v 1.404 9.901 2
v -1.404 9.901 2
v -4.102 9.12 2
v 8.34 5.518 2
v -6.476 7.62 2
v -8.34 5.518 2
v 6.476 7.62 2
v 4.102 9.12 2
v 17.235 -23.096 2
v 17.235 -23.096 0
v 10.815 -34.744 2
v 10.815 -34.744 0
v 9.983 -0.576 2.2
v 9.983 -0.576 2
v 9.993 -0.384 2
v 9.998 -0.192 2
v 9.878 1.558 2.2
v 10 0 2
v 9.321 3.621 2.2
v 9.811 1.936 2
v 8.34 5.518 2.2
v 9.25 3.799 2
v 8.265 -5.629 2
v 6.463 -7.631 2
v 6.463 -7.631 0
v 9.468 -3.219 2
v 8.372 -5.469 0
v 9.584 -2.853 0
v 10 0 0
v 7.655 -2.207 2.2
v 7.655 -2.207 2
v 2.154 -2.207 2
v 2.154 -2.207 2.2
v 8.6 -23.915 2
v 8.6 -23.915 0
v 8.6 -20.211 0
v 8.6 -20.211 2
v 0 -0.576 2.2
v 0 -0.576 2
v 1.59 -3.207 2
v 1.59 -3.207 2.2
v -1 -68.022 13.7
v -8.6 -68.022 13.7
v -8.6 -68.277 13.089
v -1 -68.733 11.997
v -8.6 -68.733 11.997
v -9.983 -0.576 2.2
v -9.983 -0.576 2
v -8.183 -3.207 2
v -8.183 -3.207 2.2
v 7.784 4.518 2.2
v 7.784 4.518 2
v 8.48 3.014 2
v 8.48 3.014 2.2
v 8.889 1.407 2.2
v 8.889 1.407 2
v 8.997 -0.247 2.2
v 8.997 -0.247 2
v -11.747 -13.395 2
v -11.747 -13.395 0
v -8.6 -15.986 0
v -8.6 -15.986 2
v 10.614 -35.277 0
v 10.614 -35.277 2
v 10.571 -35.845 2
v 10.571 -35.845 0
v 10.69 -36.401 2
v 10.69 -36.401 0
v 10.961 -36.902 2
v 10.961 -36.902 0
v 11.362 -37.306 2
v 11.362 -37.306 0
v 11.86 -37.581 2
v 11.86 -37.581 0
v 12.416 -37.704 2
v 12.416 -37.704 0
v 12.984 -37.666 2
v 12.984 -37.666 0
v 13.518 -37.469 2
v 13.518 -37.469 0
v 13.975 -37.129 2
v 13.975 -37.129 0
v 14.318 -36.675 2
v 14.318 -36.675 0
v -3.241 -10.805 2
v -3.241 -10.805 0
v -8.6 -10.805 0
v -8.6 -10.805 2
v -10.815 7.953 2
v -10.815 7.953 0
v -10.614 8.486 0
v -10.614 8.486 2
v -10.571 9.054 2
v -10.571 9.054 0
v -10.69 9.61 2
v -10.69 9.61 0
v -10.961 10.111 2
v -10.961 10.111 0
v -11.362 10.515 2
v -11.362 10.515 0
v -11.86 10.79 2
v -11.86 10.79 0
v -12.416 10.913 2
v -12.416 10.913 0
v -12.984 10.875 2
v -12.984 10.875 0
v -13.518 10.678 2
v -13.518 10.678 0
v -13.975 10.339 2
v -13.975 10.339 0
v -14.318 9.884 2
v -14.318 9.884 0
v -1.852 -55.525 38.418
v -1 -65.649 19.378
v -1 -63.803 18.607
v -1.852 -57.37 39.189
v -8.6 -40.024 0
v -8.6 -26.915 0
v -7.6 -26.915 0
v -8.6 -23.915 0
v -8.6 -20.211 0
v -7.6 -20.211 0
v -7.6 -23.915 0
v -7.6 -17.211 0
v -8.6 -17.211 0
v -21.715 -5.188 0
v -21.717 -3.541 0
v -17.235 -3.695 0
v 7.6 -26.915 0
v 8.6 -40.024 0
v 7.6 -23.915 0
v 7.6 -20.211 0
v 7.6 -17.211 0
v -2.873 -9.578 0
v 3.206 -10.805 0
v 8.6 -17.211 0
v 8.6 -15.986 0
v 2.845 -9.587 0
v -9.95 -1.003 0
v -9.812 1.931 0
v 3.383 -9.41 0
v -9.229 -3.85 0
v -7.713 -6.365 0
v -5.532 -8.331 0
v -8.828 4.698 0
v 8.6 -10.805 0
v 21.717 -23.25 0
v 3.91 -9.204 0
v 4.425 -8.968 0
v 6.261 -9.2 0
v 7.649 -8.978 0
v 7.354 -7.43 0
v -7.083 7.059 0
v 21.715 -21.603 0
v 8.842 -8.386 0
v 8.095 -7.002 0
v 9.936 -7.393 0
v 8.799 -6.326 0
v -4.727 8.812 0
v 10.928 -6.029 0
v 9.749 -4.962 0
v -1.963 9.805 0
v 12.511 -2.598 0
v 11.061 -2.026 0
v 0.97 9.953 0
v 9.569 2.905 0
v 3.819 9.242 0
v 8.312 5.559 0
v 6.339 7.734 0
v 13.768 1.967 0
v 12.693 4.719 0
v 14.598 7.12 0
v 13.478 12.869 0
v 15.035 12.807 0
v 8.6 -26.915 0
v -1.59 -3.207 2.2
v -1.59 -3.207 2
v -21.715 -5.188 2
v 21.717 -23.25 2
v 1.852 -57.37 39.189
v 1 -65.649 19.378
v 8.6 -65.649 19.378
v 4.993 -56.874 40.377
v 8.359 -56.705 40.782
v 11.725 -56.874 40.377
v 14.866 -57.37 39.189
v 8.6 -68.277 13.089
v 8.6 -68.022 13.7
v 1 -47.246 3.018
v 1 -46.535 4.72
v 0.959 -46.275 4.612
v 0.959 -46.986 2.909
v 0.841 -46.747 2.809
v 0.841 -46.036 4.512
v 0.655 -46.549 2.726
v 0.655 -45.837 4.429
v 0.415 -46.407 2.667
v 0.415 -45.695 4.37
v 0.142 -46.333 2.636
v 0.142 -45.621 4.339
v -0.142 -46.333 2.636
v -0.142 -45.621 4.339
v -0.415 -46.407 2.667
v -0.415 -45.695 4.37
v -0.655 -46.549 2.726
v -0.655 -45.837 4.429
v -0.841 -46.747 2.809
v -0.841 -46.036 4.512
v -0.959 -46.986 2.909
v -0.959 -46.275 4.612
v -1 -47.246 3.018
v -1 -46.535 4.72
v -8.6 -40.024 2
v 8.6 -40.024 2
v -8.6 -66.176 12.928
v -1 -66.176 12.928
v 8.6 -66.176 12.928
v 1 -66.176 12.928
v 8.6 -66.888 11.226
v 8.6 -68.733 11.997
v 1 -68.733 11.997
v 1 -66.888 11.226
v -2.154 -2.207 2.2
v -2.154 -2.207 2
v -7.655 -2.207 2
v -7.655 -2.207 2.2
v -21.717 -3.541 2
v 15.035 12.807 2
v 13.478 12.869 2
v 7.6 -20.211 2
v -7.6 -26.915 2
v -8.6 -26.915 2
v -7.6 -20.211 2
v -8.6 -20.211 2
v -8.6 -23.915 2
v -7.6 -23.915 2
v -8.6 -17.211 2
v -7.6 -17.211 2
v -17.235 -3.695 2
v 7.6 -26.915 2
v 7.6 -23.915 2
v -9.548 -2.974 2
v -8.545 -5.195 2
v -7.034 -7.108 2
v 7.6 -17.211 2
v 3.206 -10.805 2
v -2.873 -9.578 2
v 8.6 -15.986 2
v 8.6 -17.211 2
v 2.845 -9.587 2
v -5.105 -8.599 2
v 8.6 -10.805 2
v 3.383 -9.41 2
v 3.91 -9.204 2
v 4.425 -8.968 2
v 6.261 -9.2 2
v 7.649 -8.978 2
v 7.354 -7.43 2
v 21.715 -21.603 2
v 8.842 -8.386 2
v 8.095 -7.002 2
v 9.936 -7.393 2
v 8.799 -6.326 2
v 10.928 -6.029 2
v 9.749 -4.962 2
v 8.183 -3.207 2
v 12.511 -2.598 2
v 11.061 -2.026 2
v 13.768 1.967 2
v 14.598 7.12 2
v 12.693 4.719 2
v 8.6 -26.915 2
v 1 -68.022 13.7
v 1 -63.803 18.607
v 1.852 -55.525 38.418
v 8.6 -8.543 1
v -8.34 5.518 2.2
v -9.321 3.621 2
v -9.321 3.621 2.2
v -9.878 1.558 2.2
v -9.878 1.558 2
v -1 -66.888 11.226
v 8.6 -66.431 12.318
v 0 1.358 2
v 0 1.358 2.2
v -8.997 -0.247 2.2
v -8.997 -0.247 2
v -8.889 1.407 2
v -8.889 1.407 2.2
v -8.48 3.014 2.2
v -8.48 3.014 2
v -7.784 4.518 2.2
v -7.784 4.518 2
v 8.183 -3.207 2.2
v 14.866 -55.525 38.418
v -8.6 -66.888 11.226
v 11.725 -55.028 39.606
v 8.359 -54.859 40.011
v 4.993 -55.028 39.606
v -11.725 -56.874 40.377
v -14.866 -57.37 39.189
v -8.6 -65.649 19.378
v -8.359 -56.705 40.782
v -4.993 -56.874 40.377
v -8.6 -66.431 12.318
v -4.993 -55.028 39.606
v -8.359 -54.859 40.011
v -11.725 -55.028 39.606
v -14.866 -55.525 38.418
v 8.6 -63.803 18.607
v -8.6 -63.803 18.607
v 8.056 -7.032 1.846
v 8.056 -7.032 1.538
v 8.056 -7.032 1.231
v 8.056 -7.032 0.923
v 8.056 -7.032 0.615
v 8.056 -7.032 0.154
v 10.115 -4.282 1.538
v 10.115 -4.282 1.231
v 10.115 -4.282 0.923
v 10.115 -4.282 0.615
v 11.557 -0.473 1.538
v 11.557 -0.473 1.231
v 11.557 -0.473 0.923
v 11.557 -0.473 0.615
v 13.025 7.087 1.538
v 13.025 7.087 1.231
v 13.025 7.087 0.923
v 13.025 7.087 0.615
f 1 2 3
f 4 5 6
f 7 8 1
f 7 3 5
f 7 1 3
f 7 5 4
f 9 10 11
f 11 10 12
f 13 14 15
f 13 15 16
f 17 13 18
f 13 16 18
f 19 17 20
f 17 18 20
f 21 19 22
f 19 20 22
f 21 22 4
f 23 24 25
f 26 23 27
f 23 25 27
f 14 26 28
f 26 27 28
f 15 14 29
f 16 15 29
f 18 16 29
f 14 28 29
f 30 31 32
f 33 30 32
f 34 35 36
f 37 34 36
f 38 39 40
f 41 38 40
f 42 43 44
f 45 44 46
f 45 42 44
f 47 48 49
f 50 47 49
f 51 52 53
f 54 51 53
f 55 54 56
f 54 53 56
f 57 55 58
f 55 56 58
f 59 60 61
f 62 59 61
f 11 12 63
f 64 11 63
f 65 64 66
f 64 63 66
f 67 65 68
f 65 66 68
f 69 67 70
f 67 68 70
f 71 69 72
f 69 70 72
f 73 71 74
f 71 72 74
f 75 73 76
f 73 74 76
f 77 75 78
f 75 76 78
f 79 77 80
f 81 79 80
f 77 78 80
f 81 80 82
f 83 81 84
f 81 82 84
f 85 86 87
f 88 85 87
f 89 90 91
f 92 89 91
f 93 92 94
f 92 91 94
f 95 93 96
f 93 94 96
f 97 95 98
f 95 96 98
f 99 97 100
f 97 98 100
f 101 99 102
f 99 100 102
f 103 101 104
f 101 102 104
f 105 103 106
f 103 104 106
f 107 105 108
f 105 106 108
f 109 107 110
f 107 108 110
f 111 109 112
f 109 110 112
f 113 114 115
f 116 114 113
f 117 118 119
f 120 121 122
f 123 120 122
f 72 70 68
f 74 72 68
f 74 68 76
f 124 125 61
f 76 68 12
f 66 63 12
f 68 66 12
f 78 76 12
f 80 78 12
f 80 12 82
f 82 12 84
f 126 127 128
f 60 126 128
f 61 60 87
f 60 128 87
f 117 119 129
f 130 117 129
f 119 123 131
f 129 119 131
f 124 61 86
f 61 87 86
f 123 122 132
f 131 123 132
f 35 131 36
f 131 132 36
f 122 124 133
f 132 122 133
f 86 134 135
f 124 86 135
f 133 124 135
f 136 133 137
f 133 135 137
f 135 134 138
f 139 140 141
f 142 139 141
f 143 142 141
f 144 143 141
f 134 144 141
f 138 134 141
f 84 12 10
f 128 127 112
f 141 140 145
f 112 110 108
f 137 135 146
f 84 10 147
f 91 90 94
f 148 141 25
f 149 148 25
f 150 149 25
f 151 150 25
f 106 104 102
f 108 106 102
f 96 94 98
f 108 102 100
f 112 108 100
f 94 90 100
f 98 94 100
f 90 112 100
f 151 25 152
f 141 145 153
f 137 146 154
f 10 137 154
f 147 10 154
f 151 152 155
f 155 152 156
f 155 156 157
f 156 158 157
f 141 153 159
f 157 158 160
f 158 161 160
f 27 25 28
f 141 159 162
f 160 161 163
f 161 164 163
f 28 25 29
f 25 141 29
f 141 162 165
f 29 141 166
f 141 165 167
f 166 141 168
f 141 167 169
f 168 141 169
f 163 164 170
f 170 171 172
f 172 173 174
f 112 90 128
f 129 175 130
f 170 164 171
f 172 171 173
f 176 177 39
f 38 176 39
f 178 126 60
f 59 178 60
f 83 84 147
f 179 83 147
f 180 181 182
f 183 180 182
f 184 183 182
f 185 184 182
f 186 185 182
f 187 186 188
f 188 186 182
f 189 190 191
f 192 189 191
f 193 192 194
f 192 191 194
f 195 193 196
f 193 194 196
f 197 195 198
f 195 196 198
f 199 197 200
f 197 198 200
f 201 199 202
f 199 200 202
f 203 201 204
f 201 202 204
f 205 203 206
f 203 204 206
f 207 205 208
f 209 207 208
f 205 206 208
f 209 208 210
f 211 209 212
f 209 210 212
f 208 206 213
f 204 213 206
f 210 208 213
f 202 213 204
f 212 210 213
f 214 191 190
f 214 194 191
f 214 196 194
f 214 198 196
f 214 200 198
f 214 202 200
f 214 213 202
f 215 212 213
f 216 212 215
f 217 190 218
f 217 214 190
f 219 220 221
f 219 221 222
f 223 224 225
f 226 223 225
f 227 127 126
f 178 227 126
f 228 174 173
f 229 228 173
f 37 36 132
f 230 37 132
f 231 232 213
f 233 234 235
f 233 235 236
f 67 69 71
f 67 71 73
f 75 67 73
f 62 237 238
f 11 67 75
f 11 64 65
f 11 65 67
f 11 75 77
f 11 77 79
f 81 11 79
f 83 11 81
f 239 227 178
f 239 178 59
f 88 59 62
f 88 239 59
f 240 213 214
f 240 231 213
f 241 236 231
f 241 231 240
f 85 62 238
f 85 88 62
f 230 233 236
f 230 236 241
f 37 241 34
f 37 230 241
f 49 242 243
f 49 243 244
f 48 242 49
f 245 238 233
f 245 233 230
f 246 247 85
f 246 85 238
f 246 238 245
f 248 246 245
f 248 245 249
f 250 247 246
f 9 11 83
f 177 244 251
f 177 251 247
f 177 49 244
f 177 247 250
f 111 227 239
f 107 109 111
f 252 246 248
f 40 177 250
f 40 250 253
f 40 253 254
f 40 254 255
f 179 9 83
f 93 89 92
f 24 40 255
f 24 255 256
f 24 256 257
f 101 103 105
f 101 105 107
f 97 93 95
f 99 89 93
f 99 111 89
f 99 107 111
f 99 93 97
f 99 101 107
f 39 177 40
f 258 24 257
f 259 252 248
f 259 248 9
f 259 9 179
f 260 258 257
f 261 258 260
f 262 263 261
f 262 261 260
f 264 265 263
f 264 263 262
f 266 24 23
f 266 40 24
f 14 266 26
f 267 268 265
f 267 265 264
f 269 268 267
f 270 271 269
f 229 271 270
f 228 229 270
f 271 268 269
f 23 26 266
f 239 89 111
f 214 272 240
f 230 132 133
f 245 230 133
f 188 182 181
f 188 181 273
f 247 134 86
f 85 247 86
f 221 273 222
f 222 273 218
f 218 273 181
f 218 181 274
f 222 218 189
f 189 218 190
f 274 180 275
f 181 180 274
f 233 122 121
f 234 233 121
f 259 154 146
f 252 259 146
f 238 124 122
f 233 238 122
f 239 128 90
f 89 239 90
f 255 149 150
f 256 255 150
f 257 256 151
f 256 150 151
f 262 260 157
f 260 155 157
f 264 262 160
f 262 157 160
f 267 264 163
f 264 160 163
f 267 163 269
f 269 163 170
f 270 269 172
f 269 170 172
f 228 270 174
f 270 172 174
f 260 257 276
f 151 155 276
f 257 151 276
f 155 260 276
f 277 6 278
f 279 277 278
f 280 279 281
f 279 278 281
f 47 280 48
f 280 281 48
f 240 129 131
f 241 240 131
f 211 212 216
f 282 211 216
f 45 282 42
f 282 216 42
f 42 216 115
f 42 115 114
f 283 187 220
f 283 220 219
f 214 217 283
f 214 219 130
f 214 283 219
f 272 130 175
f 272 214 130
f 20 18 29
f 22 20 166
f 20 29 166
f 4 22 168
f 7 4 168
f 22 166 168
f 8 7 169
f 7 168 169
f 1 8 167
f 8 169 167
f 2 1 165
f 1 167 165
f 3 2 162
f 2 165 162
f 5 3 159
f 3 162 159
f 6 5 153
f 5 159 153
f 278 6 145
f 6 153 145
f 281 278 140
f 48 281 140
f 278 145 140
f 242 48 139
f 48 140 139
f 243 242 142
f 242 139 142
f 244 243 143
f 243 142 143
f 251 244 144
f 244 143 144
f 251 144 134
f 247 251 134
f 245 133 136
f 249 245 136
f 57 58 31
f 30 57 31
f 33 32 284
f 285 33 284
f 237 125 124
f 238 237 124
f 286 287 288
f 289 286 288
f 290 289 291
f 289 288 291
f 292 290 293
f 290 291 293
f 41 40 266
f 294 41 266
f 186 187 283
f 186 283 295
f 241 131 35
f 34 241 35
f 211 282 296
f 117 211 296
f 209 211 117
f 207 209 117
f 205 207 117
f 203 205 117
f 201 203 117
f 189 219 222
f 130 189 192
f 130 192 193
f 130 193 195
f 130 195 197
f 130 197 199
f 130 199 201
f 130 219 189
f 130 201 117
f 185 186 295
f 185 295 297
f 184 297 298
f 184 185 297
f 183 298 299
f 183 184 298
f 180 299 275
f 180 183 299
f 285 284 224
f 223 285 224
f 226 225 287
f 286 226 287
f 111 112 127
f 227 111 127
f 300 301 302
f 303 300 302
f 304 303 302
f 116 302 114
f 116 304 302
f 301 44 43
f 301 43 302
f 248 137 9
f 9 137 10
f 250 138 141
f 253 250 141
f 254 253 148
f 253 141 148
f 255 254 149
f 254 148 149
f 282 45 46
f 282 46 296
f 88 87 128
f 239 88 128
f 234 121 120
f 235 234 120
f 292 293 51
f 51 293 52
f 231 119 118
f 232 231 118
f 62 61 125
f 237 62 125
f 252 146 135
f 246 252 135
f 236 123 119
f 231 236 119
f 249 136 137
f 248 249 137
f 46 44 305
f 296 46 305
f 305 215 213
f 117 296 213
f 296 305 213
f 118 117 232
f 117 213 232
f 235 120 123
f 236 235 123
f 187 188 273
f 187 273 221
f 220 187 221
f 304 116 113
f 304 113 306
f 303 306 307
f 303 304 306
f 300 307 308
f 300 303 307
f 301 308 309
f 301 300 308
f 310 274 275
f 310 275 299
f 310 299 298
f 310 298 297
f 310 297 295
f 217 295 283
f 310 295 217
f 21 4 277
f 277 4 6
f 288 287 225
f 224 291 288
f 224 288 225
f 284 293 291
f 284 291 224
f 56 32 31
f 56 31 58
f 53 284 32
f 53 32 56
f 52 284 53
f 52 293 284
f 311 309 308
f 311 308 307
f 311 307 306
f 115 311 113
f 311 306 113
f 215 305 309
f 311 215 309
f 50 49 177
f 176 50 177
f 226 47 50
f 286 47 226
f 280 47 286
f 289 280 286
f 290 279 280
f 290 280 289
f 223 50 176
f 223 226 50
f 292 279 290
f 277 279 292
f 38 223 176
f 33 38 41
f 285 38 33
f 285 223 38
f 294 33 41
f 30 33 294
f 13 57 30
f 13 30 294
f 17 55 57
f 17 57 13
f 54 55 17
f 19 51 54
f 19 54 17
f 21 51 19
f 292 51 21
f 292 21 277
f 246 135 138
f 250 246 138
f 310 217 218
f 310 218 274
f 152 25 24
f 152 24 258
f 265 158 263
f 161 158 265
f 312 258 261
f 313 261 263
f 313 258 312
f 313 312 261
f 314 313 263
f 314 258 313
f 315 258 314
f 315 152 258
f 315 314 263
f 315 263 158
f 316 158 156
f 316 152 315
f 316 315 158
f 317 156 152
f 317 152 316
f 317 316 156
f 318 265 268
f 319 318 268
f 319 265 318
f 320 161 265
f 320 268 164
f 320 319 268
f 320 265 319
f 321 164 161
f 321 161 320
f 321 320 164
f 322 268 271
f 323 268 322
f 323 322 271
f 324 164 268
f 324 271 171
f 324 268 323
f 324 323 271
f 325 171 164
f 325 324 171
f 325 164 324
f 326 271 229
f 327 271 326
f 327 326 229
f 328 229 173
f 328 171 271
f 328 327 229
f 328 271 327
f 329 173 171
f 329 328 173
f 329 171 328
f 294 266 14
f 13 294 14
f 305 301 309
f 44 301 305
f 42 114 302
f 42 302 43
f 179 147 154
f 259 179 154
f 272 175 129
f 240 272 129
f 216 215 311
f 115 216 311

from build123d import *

# Parameters (mm, degrees)
F1_DEPTH = 2
F3_DEPTH = 17.200789751
F4_W     = 1
F4_H     = 2
F5_DEPTH = 25
F7_DEPTH = 2
F9_DEPTH = 0.2


# Not quite as in the source:
# - the dataset's text gives a spline's control points without its knots; the knots are read off the source's solid
# - a feature names something its author has since deleted; it is built from what else it names


with BuildPart() as f1:
    # F0 (on Top) → F1 (new body)
    with BuildSketch(Plane.XY):
        with BuildLine():
            ThreePointArc((6.4629719502, -7.6308579839), (9.0727537028, -4.2053704057), (10, 0))
            ThreePointArc((10, 0), (-5.9694275413, 8.0228383275), (-2.8731869657, -9.5783504143))
            Line((-2.8731869657, -9.5783504143), (0, 0))
            Line((0, 0), (1.8618540828, -6.2738101865))
            add(Edge.make_bspline(
                [(1.8618540828, -6.2738101865), (1.9794198127, -6.3341629295), (2.5732776532, -6.6333178765), (3.6057370778, -7.0964112527), (4.8687885055, -7.50576435), (5.8045739388, -7.6494945297), (6.2976751035, -7.6438504545), (6.4629719502, -7.6308579839)],
                knots=[0.0471973375, 0.0471973375, 0.0471973375, 0.0471973375, 0.0625, 0.125, 0.1875, 0.25, 0.2838293075, 0.2838293075, 0.2838293075, 0.2838293075], degree=3))
        make_face()
        with BuildLine():
            Line((0, 0), (-2.8731869657, -9.5783504143))
            ThreePointArc((-2.8731869657, -9.5783504143), (-0.0146952719, -9.9999892024), (2.8450232941, -9.5867534888))
            Line((2.8450232941, -9.5867534888), (2.4577875555, -8.2819017585))
            Line((2.4577875555, -8.2819017585), (1.8618540828, -6.2738101865))
            Line((1.8618540828, -6.2738101865), (0, 0))
        make_face()
        with BuildLine():
            ThreePointArc((2.8450232941, -9.5867534888), (-0.0146952719, -9.9999892024), (-2.8731869657, -9.5783504143))
            Line((-2.8731869657, -9.5783504143), (-3.241058439, -10.8047244445))
            Line((-3.241058439, -10.8047244445), (3.2064757654, -10.8047244445))
            Line((3.2064757654, -10.8047244445), (2.8450232941, -9.5867534888))
        make_face()
        with BuildLine():
            add(Edge.make_bspline(
                [(6.4629719502, -7.6308579839), (6.6030627596, -7.619846729), (6.8840296576, -7.5803052276), (7.2792450589, -7.4693493545), (7.6665868261, -7.2958798164), (8.0522350381, -7.0483493763), (8.4601010219, -6.700195356), (8.8775961576, -6.2496121629), (9.4379128784, -5.5115962551), (10.1252991034, -4.3405271139), (10.8897039738, -2.5813381399), (11.5728725961, -0.5166619682), (12.3603130252, 2.5826938425), (13.095778184, 6.9972675513), (13.399766994, 10.8869404738), (13.4782410246, 12.8689533823)],
                knots=[0.2838293075, 0.2838293075, 0.2838293075, 0.2838293075, 0.3125, 0.34375, 0.375, 0.40625, 0.4375, 0.46875, 0.5, 0.5625, 0.625, 0.6875, 0.75, 0.875, 1, 1, 1, 1], degree=3))
            ThreePointArc((6.4629719502, -7.6308579839), (5.4847517485, -8.3616683896), (4.4247539743, -8.9678064356))
            add(Edge.make_bspline(
                [(4.4247539743, -8.9678064356), (5.941531364, -9.347351876), (11.7155314673, -9.1561084525), (14.6416607546, 2.8636422945), (15.0353610516, 12.807302177)],
                knots=[0.1854268528, 0.1854268528, 0.1854268528, 0.1854268528, 0.3850411547, 1, 1, 1, 1], degree=3))
            Line((15.0353610516, 12.807302177), (13.4782410246, 12.8689533823))
        make_face()
        with BuildLine():
            ThreePointArc((4.4247539743, -8.9678064356), (5.4847517485, -8.3616683896), (6.4629719502, -7.6308579839))
            add(Edge.make_bspline(
                [(1.8618540828, -6.2738101865), (1.9794198127, -6.3341629295), (2.5732776532, -6.6333178765), (3.6057370778, -7.0964112527), (4.8687885055, -7.50576435), (5.8045739388, -7.6494945297), (6.2976751035, -7.6438504545), (6.4629719502, -7.6308579839)],
                knots=[0.0471973375, 0.0471973375, 0.0471973375, 0.0471973375, 0.0625, 0.125, 0.1875, 0.25, 0.2838293075, 0.2838293075, 0.2838293075, 0.2838293075], degree=3))
            Line((1.8618540828, -6.2738101865), (2.4577875555, -8.2819017585))
            add(Edge.make_bspline(
                [(2.4577875555, -8.2819017585), (3.1280804798, -8.5721149462), (3.7854626045, -8.8078356145), (4.4247539743, -8.9678064356)],
                knots=[0.1012934121, 0.1012934121, 0.1012934121, 0.1012934121, 0.1854268528, 0.1854268528, 0.1854268528, 0.1854268528], degree=3))
        make_face()
        with BuildLine():
            Line((2.4577875555, -8.2819017585), (2.8450232941, -9.5867534888))
            ThreePointArc((2.8450232941, -9.5867534888), (3.6480390961, -9.3108437186), (4.4247539743, -8.9678064356))
            add(Edge.make_bspline(
                [(2.4577875555, -8.2819017585), (3.1280804798, -8.5721149462), (3.7854626045, -8.8078356145), (4.4247539743, -8.9678064356)],
                knots=[0.1012934121, 0.1012934121, 0.1012934121, 0.1012934121, 0.1854268528, 0.1854268528, 0.1854268528, 0.1854268528], degree=3))
        make_face()
        Polygon((3.2064757654, -10.8047244445), (-3.241058439, -10.8047244445), (-8.6003948755, -10.8047244445), (-8.6003948755, -15.9862233672), (-8.6003948755, -17.2114234168), (-7.6003948755, -17.2114234168), (-7.6003948755, -20.2114234168), (-8.6003948755, -20.2114234168), (-8.6003948755, -23.9146029156), (-7.6003948755, -23.9146029156), (-7.6003948755, -26.9146029156), (-8.6003948755, -26.9146029156), (-8.6003948755, -40.0244813867), (8.6003948755, -40.0244813867), (8.6003948755, -26.9146029156), (7.6003948755, -26.9146029156), (7.6003948755, -23.9146029156), (8.6003948755, -23.9146029156), (8.6003948755, -20.2114234168), (7.6003948755, -20.2114234168), (7.6003948755, -17.2114234168), (8.6003948755, -17.2114234168), (8.6003948755, -15.9862233672), (8.6003948755, -10.8047244445), align=None)
        Polygon((-8.6003948755, -15.9862233672), (-8.6003948755, -10.8047244445), (-11.7467804993, -13.3954739058), align=None)
        with BuildLine():
            Line((-11.7467804993, -13.3954739058), (-8.6003948755, -10.8047244445))
            Line((-8.6003948755, -10.8047244445), (-17.2348651583, -3.6950589713))
            Line((-17.2348651583, -3.6950589713), (-10.8148216824, 7.9533712388))
            ThreePointArc((-10.8148216824, 7.9533712388), (-11.6010166189, 10.6703360015), (-14.3179813816, 9.884141065))
            Line((-14.3179813816, 9.884141065), (-21.7172442848, -3.5409701289))
            Line((-21.7172442848, -3.5409701289), (-21.7148243129, -5.1877374014))
            Line((-21.7148243129, -5.1877374014), (-11.7467804993, -13.3954739058))
        make_face()
        with BuildLine():
            Line((21.7148243129, -21.6032104103), (8.6003948755, -10.8047244445))
            Line((8.6003948755, -10.8047244445), (8.6003948755, -15.9862233672))
            Line((8.6003948755, -15.9862233672), (17.2348651583, -23.0958888404))
            Line((17.2348651583, -23.0958888404), (10.8148216824, -34.7443190505))
            ThreePointArc((10.8148216824, -34.7443190505), (11.6010166189, -37.4612838132), (14.3179813816, -36.6750888767))
            Line((14.3179813816, -36.6750888767), (21.7172442848, -23.2499776828))
            Line((21.7172442848, -23.2499776828), (21.7148243129, -21.6032104103))
        make_face()
    extrude(amount=F1_DEPTH)

    # F2 (on face) → F3 (join, through all)
    with BuildSketch(Plane.YZ.offset(8.6003948755)):
        Polygon((-40.0244813867, 0), (-40.0244813867, 2), (-66.176410403, 12.9284200062), (-66.8879257534, 11.2257494531), align=None)
        Polygon((-66.8879257534, 11.2257494531), (-66.176410403, 12.9284200062), (-68.0217670369, 13.6995612992), (-68.7332823873, 11.9968907461), align=None)
        Polygon((-68.0217670369, 13.6995612992), (-66.176410403, 12.9284200062), (-63.8033605813, 18.6071759886), (-65.6487172152, 19.3783172816), align=None)
    extrude(amount=-F3_DEPTH)

    # F4 (on face) → F5 (cut)
    with BuildSketch(Plane(origin=(0, -2.8656632843, -6.8575899128), x_dir=(1, 0, 0), z_dir=(0, 0.3855706465, 0.9226783169))):
        with Locations((-0.5, -67.044358232)):
            Rectangle(F4_W, F4_H)
        with BuildLine():
            Line((1, -68.044358232), (0, -68.044358232))
            Line((0, -68.044358232), (-1, -68.044358232))
            Line((-1, -68.044358232), (-1, -69.7565637529))
            ThreePointArc((-1, -69.7565637529), (0, -70.7565637529), (1, -69.7565637529))
            Line((1, -69.7565637529), (1, -68.044358232))
        make_face()
        with Locations((0.5, -67.044358232)):
            Rectangle(F4_W, F4_H)
        with BuildLine():
            Line((-1, -66.044358232), (0, -66.044358232))
            Line((0, -66.044358232), (1, -66.044358232))
            Line((1, -66.044358232), (1, -44.7565637529))
            ThreePointArc((1, -44.7565637529), (0, -43.7565637529), (-1, -44.7565637529))
            Line((-1, -44.7565637529), (-1, -66.044358232))
        make_face()
    extrude(amount=-F5_DEPTH, mode=Mode.SUBTRACT)

    # F6 (on face) → F7 (join)
    with BuildSketch(Plane(origin=(0, -62.7830539309, 26.2359071944), x_dir=(1, 0, 0), z_dir=(0, -0.9226783169, 0.3855706465))):
        with BuildLine():
            ThreePointArc((-1.8515158445, 14.0382554382), (-8.3589539863, 15.7649961788), (-14.8663921282, 14.0382554382))
            Line((-14.8663921282, 14.0382554382), (-1.8515158445, 14.0382554382))
        make_face()
        Polygon((1, -15.4322651642), (8.6003948755, -15.4322651642), (8.6003948755, -14.2483813688), (8.6003948755, -7.4322651642), (1, -7.4322651642), align=None)
        with BuildLine():
            Line((8.6003948755, -7.4322651642), (8.6003948755, -14.2483813688))
            Line((8.6003948755, -14.2483813688), (14.8663921282, 14.0382554382))
            ThreePointArc((14.8663921282, 14.0382554382), (8.3589539863, 15.7649961788), (1.8515158445, 14.0382554382))
            Line((1.8515158445, 14.0382554382), (1, -7.4322651642))
            Line((1, -7.4322651642), (8.6003948755, -7.4322651642))
        make_face()
        Polygon((-8.6003948755, -7.4322651642), (-1, -7.4322651642), (-1.8515158445, 14.0382554382), (-14.8663921282, 14.0382554382), (-8.6003948755, -14.2483813688), align=None)
    extrude(amount=-F7_DEPTH)

    # F8 (on face) → F9 (join)
    with BuildSketch(Plane.XY.offset(2)):
        with BuildLine():
            Line((8.3395420131, 5.5183366165), (-8.3395420131, 5.5183366165))
            ThreePointArc((-8.3395420131, 5.5183366165), (-9.6548741312, 2.6044971704), (-9.9834241522, -0.575536443))
            Line((-9.9834241522, -0.575536443), (-8.1826943192, -3.206660389))
            Line((-8.1826943192, -3.206660389), (-1.5899471466, -3.206660389))
            Line((-1.5899471466, -3.206660389), (0, -0.575536443))
            Line((0, -0.575536443), (1.5899471466, -3.206660389))
            Line((1.5899471466, -3.206660389), (8.1826943192, -3.206660389))
            Line((8.1826943192, -3.206660389), (9.9834241522, -0.575536443))
            ThreePointArc((9.9834241522, -0.575536443), (9.6548741312, 2.6044971704), (8.3395420131, 5.5183366165))
        make_face()
        with BuildLine():
            ThreePointArc((-8.9966146265, -0.2468304304), (-8.721852762, 2.2201991799), (-7.7836131854, 4.5183366165))
            Line((-7.7836131854, 4.5183366165), (7.7836131854, 4.5183366165))
            ThreePointArc((7.7836131854, 4.5183366165), (8.721852762, 2.2201991799), (8.9966146265, -0.2468304304))
            Line((8.9966146265, -0.2468304304), (7.6553154911, -2.206660389))
            Line((7.6553154911, -2.206660389), (2.1540632086, -2.206660389))
            Line((2.1540632086, -2.206660389), (0, 1.3579909904))
            Line((0, 1.3579909904), (-2.1540632086, -2.206660389))
            Line((-2.1540632086, -2.206660389), (-7.6553154911, -2.206660389))
            Line((-7.6553154911, -2.206660389), (-8.9966146265, -0.2468304304))
        make_face(mode=Mode.SUBTRACT)
    extrude(amount=F9_DEPTH)


solid = f1.part
